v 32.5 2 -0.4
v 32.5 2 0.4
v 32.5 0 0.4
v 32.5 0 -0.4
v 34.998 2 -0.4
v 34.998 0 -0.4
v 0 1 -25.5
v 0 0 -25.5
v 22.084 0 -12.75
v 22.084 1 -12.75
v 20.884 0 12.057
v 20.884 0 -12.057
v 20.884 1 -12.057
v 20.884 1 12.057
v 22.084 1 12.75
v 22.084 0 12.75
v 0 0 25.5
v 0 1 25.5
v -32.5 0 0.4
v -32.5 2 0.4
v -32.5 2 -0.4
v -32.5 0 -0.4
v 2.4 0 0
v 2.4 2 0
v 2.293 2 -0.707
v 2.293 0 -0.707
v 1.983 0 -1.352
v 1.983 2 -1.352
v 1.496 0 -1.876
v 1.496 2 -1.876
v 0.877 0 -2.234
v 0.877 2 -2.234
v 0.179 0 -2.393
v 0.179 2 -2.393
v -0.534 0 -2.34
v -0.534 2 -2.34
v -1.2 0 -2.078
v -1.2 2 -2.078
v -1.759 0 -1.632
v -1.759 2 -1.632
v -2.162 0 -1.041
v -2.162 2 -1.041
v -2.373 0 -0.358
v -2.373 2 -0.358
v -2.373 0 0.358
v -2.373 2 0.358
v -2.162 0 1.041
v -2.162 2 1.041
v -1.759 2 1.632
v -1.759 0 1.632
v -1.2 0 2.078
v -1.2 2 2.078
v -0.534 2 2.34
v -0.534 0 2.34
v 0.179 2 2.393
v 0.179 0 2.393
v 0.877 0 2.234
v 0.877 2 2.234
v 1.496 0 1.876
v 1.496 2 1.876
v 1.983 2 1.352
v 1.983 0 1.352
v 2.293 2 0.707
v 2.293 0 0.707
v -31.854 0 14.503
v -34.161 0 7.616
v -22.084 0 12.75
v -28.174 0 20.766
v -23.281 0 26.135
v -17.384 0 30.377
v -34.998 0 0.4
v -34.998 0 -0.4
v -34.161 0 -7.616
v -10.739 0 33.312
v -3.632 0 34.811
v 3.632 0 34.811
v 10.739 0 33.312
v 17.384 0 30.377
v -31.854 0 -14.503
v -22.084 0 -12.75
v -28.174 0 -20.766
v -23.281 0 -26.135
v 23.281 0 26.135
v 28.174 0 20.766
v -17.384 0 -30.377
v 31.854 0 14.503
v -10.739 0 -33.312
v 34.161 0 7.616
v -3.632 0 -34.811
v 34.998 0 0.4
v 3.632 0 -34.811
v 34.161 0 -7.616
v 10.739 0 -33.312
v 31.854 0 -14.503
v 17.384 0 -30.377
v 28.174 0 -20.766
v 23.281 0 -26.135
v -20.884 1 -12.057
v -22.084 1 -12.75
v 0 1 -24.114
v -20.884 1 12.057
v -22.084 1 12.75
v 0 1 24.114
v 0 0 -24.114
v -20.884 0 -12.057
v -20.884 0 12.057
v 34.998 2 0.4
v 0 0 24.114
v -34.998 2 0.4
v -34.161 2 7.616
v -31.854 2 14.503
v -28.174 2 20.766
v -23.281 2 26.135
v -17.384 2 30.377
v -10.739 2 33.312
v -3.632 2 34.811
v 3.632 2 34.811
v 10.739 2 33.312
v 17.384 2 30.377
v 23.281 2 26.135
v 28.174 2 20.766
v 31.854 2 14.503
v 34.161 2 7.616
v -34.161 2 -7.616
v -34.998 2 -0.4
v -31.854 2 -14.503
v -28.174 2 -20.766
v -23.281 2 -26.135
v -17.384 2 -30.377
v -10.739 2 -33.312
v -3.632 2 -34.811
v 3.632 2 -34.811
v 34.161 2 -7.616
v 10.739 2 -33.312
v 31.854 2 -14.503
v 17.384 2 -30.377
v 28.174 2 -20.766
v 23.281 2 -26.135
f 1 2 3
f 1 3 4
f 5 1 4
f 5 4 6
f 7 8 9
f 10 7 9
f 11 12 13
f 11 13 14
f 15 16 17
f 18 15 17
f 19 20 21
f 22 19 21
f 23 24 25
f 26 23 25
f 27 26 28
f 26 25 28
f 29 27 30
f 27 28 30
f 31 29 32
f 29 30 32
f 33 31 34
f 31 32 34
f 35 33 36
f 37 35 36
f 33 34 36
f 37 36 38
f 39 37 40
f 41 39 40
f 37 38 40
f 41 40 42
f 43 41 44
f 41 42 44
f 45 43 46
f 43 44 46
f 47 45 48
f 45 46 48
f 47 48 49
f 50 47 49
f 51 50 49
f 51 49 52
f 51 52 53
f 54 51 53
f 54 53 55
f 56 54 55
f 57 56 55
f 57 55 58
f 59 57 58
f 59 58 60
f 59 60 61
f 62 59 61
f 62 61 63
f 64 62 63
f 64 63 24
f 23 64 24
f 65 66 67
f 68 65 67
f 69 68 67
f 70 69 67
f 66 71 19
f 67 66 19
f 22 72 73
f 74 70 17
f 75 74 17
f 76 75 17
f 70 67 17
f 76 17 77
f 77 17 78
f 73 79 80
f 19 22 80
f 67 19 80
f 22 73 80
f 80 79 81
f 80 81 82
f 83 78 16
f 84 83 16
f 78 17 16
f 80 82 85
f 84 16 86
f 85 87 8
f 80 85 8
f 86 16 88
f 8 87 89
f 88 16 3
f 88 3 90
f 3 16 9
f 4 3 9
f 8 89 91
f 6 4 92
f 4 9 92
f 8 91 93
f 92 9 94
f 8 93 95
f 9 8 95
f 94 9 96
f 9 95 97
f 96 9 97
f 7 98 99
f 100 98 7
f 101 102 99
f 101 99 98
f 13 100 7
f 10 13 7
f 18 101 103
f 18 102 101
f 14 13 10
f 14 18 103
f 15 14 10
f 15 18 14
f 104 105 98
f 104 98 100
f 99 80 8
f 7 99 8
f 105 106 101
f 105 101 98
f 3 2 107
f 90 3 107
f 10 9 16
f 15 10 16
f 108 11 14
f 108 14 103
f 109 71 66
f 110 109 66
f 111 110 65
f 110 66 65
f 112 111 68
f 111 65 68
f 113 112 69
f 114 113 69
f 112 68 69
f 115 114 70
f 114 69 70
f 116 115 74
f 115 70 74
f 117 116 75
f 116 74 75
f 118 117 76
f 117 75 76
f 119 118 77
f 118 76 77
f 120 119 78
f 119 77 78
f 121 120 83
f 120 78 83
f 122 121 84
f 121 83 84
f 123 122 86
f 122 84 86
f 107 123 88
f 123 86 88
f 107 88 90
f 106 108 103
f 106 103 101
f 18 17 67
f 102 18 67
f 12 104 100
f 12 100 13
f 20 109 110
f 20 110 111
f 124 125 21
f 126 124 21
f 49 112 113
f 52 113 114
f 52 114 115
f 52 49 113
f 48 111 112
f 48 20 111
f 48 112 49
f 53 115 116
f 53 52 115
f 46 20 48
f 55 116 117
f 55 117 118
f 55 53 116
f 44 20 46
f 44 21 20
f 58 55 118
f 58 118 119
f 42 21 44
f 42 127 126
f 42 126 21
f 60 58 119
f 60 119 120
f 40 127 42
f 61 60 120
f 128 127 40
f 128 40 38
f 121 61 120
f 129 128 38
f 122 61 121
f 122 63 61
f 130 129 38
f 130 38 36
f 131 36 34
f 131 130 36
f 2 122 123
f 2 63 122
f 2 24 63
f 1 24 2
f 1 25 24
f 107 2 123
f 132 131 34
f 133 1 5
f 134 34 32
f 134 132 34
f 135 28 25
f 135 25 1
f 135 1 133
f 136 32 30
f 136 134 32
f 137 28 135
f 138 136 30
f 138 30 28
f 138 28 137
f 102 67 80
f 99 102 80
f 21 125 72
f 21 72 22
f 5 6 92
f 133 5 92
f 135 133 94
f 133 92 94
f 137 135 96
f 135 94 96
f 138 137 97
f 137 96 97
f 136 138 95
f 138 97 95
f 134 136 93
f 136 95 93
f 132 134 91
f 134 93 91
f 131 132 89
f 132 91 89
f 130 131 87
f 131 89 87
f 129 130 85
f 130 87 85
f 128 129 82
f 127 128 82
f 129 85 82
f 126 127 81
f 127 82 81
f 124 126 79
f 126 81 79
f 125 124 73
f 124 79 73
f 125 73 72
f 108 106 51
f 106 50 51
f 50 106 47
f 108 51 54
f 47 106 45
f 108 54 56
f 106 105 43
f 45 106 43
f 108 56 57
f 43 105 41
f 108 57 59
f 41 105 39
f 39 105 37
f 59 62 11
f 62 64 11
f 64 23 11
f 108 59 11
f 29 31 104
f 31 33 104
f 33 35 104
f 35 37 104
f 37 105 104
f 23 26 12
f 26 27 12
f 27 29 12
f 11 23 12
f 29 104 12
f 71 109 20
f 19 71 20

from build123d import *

# Parameters (mm, degrees)
SKETCH_3_R          = 35
EXTRUDE_1_DEPTH     = 2
SKETCH_4_W          = 5
SKETCH_4_H          = 0.8
CUT_EXTRUDE_6_DEPTH = 3
SKETCH_5_R          = 2.4
CUT_EXTRUDE_7_DEPTH = 3
CUT_EXTRUDE_8_DEPTH = 1


with BuildPart() as part:
    # 스케치3 → 보스-돌출1 (new body)
    with BuildSketch(Plane(origin=(0, 0, 0), x_dir=(1, 0, 0), z_dir=(0, 1, 0))):
        Circle(SKETCH_3_R)
    extrude(amount=EXTRUDE_1_DEPTH)

    # 스케치4 → 컷-돌출6 (cut, through all)
    with BuildSketch(Plane(origin=(0, 2, 0), x_dir=(1, 0, 0), z_dir=(0, 1, 0))):
        with Locations((-35, 0)):
            Rectangle(SKETCH_4_W, SKETCH_4_H)
        with Locations((35, 0)):
            Rectangle(SKETCH_4_W, SKETCH_4_H)
    extrude(amount=-CUT_EXTRUDE_6_DEPTH, mode=Mode.SUBTRACT)

    # 스케치5 → 컷-돌출7 (cut, through all)
    with BuildSketch(Plane(origin=(0, 2, 0), x_dir=(1, 0, 0), z_dir=(0, 1, 0))):
        Circle(SKETCH_5_R)
    extrude(amount=-CUT_EXTRUDE_7_DEPTH, mode=Mode.SUBTRACT)

    # 스케치6 → 컷-돌출8 (cut)
    with BuildSketch(Plane.XZ):
        Polygon((-22.083647797, 12.75), (-22.083647797, -12.75), (0, -25.5), (22.083647797, -12.75), (22.083647797, 12.75), (0, 25.5), align=None)
        Polygon((-20.883647797, 12.057179677), (-20.883647797, -12.057179677), (0, -24.114359354), (20.883647797, -12.057179677), (20.883647797, 12.057179677), (0, 24.114359354), align=None, mode=Mode.SUBTRACT)
    extrude(amount=-CUT_EXTRUDE_8_DEPTH, mode=Mode.SUBTRACT)


solid = part.part
